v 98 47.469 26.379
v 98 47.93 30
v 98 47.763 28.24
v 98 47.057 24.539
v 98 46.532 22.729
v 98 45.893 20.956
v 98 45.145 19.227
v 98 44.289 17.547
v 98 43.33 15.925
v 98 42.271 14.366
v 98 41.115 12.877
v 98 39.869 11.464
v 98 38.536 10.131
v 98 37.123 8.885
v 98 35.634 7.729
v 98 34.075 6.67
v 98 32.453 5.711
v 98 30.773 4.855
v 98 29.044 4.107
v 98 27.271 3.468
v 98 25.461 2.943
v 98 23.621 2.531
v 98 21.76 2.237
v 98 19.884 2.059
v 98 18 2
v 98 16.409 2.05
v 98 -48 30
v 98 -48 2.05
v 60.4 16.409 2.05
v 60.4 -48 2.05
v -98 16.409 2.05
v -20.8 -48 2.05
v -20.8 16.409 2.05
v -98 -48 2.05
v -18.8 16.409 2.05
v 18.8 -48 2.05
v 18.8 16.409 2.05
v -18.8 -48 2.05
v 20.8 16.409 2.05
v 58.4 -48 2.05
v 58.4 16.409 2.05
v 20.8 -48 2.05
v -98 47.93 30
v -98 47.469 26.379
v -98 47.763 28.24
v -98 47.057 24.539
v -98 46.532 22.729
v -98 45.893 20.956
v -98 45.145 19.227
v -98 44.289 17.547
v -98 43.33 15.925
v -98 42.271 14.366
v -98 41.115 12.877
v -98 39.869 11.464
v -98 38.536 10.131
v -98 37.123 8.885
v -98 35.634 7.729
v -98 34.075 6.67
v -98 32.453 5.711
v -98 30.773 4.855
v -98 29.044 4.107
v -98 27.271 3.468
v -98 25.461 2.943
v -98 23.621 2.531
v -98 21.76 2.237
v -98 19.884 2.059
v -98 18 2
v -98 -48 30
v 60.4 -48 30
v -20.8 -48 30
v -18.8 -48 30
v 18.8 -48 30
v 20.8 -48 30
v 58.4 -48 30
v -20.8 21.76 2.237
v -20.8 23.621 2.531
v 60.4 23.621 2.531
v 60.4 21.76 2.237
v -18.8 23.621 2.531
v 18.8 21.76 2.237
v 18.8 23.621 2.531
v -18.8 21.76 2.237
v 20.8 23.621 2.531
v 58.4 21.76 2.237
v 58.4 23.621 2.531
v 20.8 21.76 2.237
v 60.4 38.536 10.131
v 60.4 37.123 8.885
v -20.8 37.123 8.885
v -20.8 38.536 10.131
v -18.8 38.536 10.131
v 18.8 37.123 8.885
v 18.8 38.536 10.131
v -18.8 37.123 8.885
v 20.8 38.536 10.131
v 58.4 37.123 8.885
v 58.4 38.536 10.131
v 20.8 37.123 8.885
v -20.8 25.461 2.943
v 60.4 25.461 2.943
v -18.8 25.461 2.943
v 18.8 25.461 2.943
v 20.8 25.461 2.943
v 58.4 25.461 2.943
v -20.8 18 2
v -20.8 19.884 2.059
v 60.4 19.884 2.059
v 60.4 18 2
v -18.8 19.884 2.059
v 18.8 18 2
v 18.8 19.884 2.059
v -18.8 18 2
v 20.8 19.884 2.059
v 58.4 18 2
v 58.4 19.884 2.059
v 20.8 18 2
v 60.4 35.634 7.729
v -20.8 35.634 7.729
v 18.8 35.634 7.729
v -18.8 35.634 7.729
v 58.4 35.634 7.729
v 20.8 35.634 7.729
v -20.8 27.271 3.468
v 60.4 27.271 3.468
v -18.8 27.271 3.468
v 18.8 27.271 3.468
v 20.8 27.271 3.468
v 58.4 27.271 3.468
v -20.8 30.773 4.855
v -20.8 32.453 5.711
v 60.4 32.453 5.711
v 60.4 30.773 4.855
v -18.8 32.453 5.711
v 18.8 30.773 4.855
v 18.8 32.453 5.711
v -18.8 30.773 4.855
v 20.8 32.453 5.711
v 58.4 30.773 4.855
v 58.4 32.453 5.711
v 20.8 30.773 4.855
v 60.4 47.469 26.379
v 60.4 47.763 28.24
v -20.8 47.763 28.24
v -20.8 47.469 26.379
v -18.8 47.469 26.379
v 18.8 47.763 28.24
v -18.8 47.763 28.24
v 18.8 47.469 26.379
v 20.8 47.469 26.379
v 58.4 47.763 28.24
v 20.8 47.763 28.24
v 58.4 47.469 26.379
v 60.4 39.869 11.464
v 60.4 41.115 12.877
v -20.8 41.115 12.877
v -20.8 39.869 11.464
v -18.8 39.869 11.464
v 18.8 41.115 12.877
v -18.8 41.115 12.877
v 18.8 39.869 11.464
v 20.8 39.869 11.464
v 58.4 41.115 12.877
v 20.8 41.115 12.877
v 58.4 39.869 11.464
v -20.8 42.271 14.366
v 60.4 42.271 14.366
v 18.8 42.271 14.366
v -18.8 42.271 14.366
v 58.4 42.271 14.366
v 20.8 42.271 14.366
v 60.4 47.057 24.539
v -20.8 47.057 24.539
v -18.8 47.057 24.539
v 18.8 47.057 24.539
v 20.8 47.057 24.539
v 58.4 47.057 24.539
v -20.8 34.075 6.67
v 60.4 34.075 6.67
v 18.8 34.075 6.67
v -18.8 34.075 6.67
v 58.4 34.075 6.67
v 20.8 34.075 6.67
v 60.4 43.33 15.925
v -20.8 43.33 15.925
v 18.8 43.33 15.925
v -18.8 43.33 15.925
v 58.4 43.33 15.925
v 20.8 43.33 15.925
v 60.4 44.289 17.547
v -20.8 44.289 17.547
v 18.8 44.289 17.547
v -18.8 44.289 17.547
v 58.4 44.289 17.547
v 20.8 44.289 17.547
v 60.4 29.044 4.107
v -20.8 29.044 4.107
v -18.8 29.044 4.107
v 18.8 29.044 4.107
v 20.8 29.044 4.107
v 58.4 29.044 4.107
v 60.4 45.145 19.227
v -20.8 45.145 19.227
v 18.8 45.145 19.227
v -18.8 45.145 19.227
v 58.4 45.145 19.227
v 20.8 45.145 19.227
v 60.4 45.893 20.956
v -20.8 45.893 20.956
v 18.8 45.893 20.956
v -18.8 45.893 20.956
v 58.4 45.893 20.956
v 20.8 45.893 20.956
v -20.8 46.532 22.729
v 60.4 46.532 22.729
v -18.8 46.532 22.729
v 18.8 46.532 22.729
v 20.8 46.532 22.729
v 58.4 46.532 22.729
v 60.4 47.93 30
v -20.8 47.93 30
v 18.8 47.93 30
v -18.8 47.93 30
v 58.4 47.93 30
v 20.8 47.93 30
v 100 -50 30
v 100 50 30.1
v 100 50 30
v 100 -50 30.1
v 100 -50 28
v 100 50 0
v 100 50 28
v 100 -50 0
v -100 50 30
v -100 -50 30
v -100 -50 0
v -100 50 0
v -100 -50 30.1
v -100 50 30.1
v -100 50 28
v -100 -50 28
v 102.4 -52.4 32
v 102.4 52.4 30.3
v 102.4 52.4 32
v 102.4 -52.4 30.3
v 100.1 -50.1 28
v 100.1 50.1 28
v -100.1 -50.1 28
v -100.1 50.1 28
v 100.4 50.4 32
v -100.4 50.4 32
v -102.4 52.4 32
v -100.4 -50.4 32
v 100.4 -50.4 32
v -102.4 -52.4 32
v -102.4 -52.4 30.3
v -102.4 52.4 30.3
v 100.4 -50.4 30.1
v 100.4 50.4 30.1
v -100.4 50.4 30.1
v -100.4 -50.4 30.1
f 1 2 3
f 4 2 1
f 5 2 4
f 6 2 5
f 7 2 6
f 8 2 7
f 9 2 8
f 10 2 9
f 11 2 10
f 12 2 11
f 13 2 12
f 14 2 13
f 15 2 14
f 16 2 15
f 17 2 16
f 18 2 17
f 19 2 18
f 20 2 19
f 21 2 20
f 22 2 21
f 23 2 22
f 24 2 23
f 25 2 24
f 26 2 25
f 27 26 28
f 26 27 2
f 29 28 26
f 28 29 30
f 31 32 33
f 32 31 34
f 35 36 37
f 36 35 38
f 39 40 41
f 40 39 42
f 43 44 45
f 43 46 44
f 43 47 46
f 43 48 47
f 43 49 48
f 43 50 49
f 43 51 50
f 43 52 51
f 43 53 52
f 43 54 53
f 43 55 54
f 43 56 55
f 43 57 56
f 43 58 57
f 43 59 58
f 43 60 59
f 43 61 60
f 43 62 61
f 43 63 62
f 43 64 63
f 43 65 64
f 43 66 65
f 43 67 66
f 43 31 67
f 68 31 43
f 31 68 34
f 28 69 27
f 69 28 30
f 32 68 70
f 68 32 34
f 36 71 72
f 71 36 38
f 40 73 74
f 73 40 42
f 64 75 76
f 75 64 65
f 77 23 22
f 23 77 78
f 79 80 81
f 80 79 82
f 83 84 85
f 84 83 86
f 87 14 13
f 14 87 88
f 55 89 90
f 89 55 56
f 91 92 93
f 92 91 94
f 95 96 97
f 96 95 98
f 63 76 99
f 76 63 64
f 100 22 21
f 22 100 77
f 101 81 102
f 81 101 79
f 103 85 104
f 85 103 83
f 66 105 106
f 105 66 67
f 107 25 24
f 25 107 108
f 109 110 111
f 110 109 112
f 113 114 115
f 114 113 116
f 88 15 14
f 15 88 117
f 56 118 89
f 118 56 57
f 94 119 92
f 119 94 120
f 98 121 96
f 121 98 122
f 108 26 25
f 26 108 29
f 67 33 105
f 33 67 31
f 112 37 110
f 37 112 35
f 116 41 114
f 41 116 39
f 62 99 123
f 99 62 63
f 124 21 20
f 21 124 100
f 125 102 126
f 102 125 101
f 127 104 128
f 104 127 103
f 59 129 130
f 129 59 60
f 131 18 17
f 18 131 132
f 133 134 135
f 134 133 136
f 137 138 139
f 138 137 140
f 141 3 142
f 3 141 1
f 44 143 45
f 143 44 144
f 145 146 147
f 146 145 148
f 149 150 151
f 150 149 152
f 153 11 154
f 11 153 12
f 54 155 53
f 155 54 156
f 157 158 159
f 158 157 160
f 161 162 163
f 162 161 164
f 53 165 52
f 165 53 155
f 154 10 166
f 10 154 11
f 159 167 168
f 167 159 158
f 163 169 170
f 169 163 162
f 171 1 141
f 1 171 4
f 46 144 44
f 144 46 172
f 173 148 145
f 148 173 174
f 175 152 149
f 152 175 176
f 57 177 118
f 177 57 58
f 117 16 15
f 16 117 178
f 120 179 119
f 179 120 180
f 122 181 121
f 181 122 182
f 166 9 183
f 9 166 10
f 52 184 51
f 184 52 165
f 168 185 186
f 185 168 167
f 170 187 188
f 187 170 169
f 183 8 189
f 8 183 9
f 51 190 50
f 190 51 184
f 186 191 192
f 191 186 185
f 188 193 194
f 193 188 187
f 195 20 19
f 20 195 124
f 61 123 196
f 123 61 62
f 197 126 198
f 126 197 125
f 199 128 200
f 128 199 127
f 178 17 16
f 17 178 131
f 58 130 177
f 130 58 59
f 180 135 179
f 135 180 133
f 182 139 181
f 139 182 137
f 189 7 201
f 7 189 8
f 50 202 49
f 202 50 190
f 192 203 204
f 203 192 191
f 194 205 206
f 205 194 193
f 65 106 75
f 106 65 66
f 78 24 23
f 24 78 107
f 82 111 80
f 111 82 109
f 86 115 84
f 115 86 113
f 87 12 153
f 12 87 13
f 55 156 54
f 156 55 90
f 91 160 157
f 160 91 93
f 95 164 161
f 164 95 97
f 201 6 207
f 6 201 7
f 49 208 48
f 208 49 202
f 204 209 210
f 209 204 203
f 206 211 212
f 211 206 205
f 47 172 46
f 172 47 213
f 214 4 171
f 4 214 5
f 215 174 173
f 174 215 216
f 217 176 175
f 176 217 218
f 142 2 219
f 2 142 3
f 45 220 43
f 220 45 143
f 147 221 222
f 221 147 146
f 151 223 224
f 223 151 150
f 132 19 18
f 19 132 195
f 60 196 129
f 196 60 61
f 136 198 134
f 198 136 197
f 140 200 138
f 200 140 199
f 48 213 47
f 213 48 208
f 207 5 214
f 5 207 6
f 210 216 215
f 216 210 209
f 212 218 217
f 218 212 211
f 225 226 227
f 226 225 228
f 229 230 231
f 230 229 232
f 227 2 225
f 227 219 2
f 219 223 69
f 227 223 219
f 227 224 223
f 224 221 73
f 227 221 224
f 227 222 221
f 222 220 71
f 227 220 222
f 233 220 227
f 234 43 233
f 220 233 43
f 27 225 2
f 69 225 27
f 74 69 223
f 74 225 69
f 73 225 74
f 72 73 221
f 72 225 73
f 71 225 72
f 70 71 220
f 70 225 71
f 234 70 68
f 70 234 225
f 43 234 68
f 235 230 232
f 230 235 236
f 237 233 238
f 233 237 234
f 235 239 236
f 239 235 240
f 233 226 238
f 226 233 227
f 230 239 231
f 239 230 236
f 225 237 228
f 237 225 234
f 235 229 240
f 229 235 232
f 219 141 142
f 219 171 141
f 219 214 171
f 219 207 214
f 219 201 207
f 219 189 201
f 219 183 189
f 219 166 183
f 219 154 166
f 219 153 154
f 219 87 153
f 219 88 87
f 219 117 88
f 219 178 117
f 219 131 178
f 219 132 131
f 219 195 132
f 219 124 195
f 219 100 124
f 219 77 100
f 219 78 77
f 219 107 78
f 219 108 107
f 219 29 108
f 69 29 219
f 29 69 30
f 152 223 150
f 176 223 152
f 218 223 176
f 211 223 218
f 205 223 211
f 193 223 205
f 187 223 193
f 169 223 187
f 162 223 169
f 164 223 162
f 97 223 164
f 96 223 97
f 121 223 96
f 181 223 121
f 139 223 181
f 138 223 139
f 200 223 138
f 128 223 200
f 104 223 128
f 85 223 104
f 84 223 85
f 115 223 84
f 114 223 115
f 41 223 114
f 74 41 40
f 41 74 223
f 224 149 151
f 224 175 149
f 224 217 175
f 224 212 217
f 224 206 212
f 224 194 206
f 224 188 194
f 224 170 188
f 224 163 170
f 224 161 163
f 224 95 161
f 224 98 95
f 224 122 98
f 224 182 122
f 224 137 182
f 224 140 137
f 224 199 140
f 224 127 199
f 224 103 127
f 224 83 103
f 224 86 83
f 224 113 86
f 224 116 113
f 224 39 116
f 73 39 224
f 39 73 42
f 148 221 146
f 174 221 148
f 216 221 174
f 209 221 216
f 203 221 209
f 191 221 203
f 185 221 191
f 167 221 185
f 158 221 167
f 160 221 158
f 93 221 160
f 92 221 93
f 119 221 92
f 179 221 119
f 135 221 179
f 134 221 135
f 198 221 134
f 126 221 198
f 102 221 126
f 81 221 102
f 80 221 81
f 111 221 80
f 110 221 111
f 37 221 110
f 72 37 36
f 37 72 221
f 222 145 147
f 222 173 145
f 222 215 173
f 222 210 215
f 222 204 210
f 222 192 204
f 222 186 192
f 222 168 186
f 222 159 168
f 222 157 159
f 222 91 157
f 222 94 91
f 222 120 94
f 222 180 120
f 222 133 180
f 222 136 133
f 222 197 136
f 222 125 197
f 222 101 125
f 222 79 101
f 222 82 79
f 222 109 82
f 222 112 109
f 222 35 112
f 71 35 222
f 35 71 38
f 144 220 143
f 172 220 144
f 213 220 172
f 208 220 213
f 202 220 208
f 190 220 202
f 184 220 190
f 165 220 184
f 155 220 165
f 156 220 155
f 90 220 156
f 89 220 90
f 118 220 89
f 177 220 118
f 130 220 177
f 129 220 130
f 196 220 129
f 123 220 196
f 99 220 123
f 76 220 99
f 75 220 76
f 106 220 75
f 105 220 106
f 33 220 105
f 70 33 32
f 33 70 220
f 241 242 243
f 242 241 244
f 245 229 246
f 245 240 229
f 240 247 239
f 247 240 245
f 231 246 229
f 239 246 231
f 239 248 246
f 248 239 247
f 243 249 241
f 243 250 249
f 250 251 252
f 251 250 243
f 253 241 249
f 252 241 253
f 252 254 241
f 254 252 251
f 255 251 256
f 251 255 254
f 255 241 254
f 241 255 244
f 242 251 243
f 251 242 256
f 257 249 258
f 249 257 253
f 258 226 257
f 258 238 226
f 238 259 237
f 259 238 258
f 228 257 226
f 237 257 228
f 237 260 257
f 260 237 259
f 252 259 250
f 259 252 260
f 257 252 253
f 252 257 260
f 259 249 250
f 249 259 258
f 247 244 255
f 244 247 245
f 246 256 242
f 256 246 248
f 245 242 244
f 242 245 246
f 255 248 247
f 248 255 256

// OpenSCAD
//Customizable stackable screw box

/* [Outside Box Dimensions] */
//Box Length
boxLen=200;
//Box Width
boxWid=100;
//Box Height
boxHgt=30;
//Wall thickness
boxThick=2;

/* [Divitions] */
// Number of Divitions
numSections=5;
// Merge sections (make one side bigger, use 2 or more to merge, 0 or 1 to normal)
mergeSections=2;


/* [Slope] */
// Shape of slope (4 = slope, more sections creates circular shape)
slopeSections=100;//[4:100]
// Use straight sides
straightSide=0;//0,1

/* [Hidden] */
dividerCount=mergeSections?numSections-mergeSections:numSections-1;


screwBox();

module screwBox() {
	echo("Number of dividers:",dividerCount);
	difference() {
		// outerbox
		translate([0,0,boxHgt/2])
			cube([boxLen,boxWid,boxHgt],center=true);
		if (straightSide) {
			// innerbox
			translate([0,0,0.1+(boxHgt/2+boxThick/2)]) 
				cube([boxLen-boxThick*2,boxWid-boxThick*2,boxHgt-boxThick+0.1],center=true);
		} else {
			// innerbox
			translate([0,0-boxHgt/2,0.1+(boxHgt/2+boxThick/2)]) 
				cube([boxLen-boxThick*2,boxWid-boxHgt-boxThick*2,boxHgt-boxThick+0.1],center=true);
			// slope
			translate([0,boxWid/2-boxHgt-boxThick,boxHgt+boxThick]) 
				rotate([0,90,0])cylinder(boxLen-boxThick*2,boxHgt,boxHgt,center=true,$fn=slopeSections);
		}
	}
	// dividers
	for (sep=[1:dividerCount]) {
		translate([(boxLen-boxThick)/2-sep*(boxLen-boxThick)/numSections,0,boxHgt/2])
			cube([boxThick,boxWid,boxHgt],center=true);
	}
	// rim
	rotate([180,0,0])union() {
		translate([0,0,0-boxHgt])difference() {
			cube([boxLen+boxThick*2+0.8,boxWid+boxThick*2+0.8,boxThick*2],center=true);
			cube([boxLen,boxWid,boxThick*2+1],center=true);
			// extra cut out for stacking
			translate([0,0,0-boxThick/2-0.1])cube([boxLen+0.8,boxWid+0.8,boxThick],center=true);
			// 45 degree support for outer edge
			translate([0,boxWid/2+boxThick*1.05,boxThick*0.7071]) 
				rotate([45,0,0])cube([boxLen+boxThick*2+1,boxThick,boxThick*2],center=true);
			translate([0,0-(boxWid/2+boxThick*1.05),boxThick*0.7071]) 
				rotate([-45,0,0])cube([boxLen+boxThick*2+1,boxThick,boxThick*2],center=true);
			translate([boxLen/2+boxThick*1.05,0,boxThick*0.7071]) 
				rotate([0,-45,0])cube([boxThick,boxWid+boxThick*2+1,boxThick*2],center=true);
			translate([0-(boxLen/2+boxThick*1.05),0,boxThick*0.7071]) 
				rotate([0,45,0])cube([boxThick,boxWid+boxThick*2+1,boxThick*2],center=true);
		}
	}
}
